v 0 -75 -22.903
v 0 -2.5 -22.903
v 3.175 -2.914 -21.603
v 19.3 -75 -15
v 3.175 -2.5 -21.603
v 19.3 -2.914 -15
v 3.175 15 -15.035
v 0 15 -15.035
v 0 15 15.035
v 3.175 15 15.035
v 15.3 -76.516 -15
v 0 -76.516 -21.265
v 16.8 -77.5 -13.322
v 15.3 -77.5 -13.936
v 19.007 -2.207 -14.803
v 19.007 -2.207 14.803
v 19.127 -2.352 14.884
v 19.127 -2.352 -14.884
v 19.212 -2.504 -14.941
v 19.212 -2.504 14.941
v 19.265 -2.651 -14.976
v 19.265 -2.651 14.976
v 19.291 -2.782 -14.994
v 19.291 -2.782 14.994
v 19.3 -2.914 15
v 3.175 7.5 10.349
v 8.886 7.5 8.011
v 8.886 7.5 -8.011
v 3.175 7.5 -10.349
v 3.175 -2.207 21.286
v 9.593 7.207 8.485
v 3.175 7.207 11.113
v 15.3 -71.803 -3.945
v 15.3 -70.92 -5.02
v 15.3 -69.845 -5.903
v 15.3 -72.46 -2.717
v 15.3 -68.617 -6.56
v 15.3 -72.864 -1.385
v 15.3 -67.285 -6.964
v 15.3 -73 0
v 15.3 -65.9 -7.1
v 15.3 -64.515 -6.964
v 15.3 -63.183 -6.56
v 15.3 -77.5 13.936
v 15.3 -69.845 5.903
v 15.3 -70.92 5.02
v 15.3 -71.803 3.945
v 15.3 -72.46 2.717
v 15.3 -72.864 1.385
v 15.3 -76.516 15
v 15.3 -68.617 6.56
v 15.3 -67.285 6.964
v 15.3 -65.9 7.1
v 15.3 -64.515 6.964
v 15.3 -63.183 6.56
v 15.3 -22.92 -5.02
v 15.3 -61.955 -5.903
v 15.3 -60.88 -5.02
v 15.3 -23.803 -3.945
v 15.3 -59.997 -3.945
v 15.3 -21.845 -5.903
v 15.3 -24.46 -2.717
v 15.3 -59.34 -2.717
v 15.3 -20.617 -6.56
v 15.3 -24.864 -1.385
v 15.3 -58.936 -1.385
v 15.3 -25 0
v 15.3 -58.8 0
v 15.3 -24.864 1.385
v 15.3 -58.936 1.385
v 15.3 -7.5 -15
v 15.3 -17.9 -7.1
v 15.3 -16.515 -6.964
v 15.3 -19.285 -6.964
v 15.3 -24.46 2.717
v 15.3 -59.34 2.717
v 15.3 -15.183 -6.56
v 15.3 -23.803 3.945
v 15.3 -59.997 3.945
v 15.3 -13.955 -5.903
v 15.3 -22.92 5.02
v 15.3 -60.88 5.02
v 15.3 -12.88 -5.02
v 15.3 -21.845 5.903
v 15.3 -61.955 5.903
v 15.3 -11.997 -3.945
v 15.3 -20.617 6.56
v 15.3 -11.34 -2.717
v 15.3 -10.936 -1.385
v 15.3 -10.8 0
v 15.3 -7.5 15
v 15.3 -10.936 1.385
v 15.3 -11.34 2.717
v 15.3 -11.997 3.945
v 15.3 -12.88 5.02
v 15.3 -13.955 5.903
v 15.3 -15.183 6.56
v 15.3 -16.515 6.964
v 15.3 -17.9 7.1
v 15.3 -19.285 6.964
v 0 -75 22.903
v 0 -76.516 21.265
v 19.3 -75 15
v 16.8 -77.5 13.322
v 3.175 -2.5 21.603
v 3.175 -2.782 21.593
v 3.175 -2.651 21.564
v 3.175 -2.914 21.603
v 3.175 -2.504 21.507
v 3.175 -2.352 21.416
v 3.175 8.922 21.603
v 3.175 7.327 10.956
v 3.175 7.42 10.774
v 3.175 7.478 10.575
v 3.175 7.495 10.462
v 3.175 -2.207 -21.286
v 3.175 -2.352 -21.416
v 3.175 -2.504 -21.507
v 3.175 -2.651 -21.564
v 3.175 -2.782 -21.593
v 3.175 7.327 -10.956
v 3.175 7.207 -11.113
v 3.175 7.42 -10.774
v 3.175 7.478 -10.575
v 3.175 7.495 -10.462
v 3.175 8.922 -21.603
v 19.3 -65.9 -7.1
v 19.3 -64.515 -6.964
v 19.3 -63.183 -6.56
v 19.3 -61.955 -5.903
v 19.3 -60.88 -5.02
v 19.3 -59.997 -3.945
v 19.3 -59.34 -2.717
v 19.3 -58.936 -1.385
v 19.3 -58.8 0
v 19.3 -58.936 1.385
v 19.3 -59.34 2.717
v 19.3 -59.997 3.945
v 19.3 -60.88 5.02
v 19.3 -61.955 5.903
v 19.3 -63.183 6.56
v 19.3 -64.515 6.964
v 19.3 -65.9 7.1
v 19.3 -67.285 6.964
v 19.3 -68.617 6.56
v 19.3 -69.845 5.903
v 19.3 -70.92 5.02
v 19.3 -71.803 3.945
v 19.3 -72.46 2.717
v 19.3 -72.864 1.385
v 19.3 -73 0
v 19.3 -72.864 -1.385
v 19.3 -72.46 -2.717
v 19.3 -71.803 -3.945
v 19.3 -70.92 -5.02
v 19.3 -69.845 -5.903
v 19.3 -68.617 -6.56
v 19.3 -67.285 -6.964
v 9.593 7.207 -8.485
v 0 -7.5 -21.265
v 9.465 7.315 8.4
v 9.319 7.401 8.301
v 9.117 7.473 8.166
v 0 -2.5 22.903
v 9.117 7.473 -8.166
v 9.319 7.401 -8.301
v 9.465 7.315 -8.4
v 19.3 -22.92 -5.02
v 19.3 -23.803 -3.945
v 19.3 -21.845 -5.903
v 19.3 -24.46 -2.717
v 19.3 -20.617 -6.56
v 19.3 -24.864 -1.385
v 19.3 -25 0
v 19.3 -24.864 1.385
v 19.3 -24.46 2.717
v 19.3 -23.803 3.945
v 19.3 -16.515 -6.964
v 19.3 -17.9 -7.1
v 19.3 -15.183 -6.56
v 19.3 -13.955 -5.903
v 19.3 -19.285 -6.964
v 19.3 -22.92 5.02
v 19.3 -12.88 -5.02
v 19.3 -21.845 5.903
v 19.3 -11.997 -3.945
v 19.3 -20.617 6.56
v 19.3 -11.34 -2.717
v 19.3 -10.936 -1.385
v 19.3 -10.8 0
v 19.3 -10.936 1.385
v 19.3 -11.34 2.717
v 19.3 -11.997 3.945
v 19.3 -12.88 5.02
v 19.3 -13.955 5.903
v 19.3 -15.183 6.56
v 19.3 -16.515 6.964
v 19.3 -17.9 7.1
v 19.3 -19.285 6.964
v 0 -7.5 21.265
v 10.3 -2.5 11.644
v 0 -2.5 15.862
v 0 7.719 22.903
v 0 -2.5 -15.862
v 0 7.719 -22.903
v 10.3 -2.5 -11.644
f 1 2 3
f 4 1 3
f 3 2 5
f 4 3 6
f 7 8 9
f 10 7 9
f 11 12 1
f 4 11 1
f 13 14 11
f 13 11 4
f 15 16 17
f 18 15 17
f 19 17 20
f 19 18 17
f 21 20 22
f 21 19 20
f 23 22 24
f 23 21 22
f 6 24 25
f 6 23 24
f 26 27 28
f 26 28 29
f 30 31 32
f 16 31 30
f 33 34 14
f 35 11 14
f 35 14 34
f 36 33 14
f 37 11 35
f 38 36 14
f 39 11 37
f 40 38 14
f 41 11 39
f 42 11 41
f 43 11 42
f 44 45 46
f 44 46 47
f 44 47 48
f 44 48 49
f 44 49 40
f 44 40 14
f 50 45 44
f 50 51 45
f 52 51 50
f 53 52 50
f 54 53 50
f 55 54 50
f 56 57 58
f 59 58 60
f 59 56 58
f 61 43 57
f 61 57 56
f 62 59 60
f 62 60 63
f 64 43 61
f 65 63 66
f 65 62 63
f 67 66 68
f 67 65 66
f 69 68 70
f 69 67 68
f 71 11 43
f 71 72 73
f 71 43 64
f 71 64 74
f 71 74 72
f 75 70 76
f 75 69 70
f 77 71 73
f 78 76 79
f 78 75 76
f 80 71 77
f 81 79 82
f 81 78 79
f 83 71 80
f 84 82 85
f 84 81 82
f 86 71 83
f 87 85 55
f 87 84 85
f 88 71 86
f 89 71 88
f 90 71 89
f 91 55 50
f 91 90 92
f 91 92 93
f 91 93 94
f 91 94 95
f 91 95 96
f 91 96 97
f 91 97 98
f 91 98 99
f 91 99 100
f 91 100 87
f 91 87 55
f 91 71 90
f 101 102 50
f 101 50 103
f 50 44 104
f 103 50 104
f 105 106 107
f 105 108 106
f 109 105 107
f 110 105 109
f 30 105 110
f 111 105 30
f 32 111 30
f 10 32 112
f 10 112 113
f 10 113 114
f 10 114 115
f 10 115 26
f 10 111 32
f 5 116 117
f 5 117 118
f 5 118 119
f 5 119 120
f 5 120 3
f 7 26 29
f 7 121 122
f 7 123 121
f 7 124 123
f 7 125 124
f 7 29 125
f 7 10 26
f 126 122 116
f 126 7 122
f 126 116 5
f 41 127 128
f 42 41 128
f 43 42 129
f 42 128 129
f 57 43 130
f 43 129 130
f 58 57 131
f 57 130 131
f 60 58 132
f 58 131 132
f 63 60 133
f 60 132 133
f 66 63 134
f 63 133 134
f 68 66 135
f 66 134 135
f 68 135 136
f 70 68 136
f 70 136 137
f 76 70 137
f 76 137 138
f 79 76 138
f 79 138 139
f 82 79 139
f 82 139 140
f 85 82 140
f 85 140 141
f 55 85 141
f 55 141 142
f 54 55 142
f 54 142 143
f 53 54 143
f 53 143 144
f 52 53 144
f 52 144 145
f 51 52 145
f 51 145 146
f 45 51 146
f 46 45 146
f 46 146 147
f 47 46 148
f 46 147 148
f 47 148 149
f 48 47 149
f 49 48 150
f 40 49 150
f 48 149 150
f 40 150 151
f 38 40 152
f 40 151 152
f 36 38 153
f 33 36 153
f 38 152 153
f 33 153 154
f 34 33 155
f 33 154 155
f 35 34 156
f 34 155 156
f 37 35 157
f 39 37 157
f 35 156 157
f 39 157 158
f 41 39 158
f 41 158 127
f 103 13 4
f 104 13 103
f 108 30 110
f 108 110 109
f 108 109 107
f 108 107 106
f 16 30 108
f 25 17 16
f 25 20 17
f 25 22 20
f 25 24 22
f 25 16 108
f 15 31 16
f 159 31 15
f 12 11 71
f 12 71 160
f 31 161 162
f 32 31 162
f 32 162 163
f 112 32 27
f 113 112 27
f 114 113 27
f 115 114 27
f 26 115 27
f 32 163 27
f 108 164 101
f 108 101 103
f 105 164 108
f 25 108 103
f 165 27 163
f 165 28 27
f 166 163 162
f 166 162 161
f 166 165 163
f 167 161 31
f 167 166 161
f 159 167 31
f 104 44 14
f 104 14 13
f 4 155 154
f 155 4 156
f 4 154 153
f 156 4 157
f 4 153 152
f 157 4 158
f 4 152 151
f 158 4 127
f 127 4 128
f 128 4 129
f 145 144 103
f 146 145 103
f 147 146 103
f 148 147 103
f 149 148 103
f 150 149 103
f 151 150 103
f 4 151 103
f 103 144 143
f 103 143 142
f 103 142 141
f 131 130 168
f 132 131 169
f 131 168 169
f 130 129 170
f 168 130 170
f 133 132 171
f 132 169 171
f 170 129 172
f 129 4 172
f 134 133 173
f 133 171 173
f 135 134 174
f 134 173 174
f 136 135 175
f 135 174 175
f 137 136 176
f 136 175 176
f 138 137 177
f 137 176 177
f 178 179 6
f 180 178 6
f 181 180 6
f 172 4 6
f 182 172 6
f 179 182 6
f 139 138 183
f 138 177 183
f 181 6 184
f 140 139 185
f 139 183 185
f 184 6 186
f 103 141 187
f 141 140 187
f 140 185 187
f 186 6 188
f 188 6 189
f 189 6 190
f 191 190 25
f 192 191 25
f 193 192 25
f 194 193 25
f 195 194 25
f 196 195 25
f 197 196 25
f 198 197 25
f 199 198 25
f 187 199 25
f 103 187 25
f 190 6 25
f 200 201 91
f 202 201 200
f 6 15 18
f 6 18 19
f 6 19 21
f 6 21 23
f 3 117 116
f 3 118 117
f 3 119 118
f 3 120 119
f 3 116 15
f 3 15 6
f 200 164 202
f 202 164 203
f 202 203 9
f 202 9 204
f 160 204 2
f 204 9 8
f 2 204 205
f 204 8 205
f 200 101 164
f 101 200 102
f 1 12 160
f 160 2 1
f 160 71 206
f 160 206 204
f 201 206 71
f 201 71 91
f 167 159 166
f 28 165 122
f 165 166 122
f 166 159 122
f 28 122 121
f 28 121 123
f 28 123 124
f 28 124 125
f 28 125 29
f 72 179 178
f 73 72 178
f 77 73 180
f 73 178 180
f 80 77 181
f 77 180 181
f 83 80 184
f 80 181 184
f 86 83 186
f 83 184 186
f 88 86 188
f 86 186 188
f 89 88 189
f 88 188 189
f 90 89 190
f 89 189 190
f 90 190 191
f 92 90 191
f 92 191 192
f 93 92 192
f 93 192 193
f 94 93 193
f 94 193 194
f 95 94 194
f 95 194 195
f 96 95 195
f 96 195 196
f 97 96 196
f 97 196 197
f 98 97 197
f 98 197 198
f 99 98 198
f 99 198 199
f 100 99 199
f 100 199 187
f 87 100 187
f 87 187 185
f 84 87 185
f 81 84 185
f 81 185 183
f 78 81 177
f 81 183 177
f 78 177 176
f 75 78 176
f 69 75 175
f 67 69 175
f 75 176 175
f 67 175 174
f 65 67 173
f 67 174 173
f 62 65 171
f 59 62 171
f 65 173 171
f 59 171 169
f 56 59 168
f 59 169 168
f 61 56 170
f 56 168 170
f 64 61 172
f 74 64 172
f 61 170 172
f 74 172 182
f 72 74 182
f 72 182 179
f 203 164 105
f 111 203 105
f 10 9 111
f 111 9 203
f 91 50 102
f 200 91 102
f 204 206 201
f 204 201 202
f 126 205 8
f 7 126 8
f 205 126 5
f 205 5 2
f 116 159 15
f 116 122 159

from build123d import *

# Parameters (mm, degrees)
SKETCH1_W            = 30
SKETCH1_H            = 5
BOSS_EXTRUDE1_DEPTH  = 19.3
SKETCH2_W            = 40
SKETCH2_H            = 10
BOSS_EXTRUDE2_DEPTH  = 3.175
SKETCH3_W            = 4
SKETCH3_H            = 30
BOSS_EXTRUDE3_DEPTH  = 75
CUT_EXTRUDE1_REACH   = 84.48
SKETCH4_R            = 7.1
BOSS_EXTRUDE7_DEPTH  = 5
BOSS_EXTRUDE8_DEPTH  = 5
CHAMFER1_SIZE        = 5
BOSS_EXTRUDE9_DEPTH  = 75
BOSS_EXTRUDE10_DEPTH = 5
CHAMFER2_SIZE        = 5
CHAMFER3_SIZE        = 10
BOSS_EXTRUDE15_DEPTH = 3.175
CUT_EXTRUDE2_DEPTH   = 81.759021382
FILLET6_R            = 1
FILLET7_R            = 1
CHAMFER6_SIZE        = 2.5


with BuildPart() as part:
    # Sketch1 → Boss-Extrude1 (new body)
    with BuildSketch(Plane(origin=(0, 0, 0), x_dir=(0, 0, -1), z_dir=(1, 0, 0))):
        Rectangle(SKETCH1_W, SKETCH1_H)
    extrude(amount=BOSS_EXTRUDE1_DEPTH)

    # Sketch2 → Boss-Extrude2 (add)
    with BuildSketch(Plane.ZY):
        with Locations((0.597390222, 2.5)):
            Rectangle(SKETCH2_W, SKETCH2_H)
    extrude(amount=-BOSS_EXTRUDE2_DEPTH)

    # Sketch3 → Boss-Extrude3 (add)
    with BuildSketch(Plane.XZ.offset(2.5)):
        with Locations((17.3, 0)):
            Rectangle(SKETCH3_W, SKETCH3_H)
    extrude(amount=BOSS_EXTRUDE3_DEPTH)

    # Sketch4 → Cut-Extrude1 (cut, up to next)
    with BuildSketch(Plane(origin=(19.3, 0, 0), x_dir=(0, 0, -1), z_dir=(1, 0, 0)), mode=Mode.PRIVATE) as cut_extrude1_sk1:
        with Locations((2.035e-06, -17.9)):
            Circle(SKETCH4_R)
    cut_extrude1_tool1 = extrude(cut_extrude1_sk1.sketch, amount=-CUT_EXTRUDE1_REACH, mode=Mode.PRIVATE) & part.part
    # Sketch4 → Cut-Extrude1 (cut, up to next)
    with BuildSketch(Plane(origin=(19.3, 0, 0), x_dir=(0, 0, -1), z_dir=(1, 0, 0)), mode=Mode.PRIVATE) as cut_extrude1_sk2:
        with Locations((-1.3e-07, -65.9)):
            Circle(SKETCH4_R)
    cut_extrude1_tool2 = extrude(cut_extrude1_sk2.sketch, amount=-CUT_EXTRUDE1_REACH, mode=Mode.PRIVATE) & part.part
    add(cut_extrude1_tool1.solids().sort_by_distance((19.3, -17.9, -2e-06))[0], mode=Mode.SUBTRACT)
    add(cut_extrude1_tool2.solids().sort_by_distance((19.3, -65.9, 0))[0], mode=Mode.SUBTRACT)

    # Sketch10 → Boss-Extrude7 (add)
    with BuildSketch(Plane(origin=(0, 2.5, 0), x_dir=(1, 0, 0), z_dir=(0, 1, 0))):
        Polygon((3.175, 19.402609778), (0, 19.402609778), (0, 22.902609778), (19.3, 15), (3.175, 15), align=None)
    boss_extrude7 = extrude(amount=-BOSS_EXTRUDE7_DEPTH)

    # Sketch11 → Boss-Extrude8 (add)
    with BuildSketch(Plane(origin=(0, 2.5, 0), x_dir=(1, 0, 0), z_dir=(0, 1, 0))):
        Polygon((0, 19.402609778), (0, 22.902609778), (3.175, 21.60256905), (3.175, 19.402609778), align=None)
    boss_extrude8 = extrude(amount=BOSS_EXTRUDE8_DEPTH)

    # Mirror2: Boss-Extrude7, Boss-Extrude8 across plane
    add(boss_extrude7.mirror(Plane(origin=(0, 0, 0), x_dir=(1, 0, 0), z_dir=(0, 0, -1))))
    add(boss_extrude8.mirror(Plane(origin=(0, 0, 0), x_dir=(1, 0, 0), z_dir=(0, 0, -1))))

    # Chamfer1
    chamfer1_edges = [part.edges().sort_by_distance(p)[0] for p in [
        (3.175, 2.5, 0),
    ]]
    chamfer(chamfer1_edges, length=CHAMFER1_SIZE - 0.0001)  # a hair under: the kernel refuses the full size

    # Sketch12 → Boss-Extrude9 (add)
    with BuildSketch(Plane.XZ.offset(2.5)):
        Polygon((0, -22.902609778), (19.3, -15), (15.3, -15), (0, -21.264763192), align=None)
        Polygon((0, 22.902609778), (19.3, 15), (15.3, 15), (0, 21.264763192), align=None)
    extrude(amount=BOSS_EXTRUDE9_DEPTH)

    # Sketch13 → Boss-Extrude10 (add)
    with BuildSketch(Plane(origin=(0, 2.5, 0), x_dir=(1, 0, 0), z_dir=(0, 1, 0))):
        Polygon((3.175, 21.60256905), (3.175, -21.60256905), (19.3, -15), (19.3, 15), align=None)
    extrude(amount=BOSS_EXTRUDE10_DEPTH)

    # Chamfer2
    chamfer2_edges = [part.edges().sort_by_distance(p)[0] for p in [
        (7.65, -2.5, -18.132381596),
        (7.65, -2.5, 18.132381596),
        (15.3, -2.5, 0),
    ]]
    chamfer(chamfer2_edges, length=CHAMFER2_SIZE)

    # Chamfer3
    chamfer3_edges = [part.edges().sort_by_distance(p)[0] for p in [
        (9.65, 7.5, 18.951304889),
        (19.3, 7.5, 0),
        (9.65, 7.5, -18.951304889),
    ]]
    chamfer(chamfer3_edges, length=CHAMFER3_SIZE)

    # Sketch14 → Boss-Extrude15 (add)
    with BuildSketch(Plane.ZY):
        Polygon((-22.902609778, -2.5), (-22.902609778, 7.718772797), (-15.034642071, 15), (15.034642071, 15), (22.902609778, 7.718772797), (22.902609778, -2.5), align=None)
    extrude(amount=-BOSS_EXTRUDE15_DEPTH)

    # Sketch15 → Cut-Extrude2 (cut, through all)
    with BuildSketch(Plane.XZ.offset(2.5)):
        Polygon((3.175, 22.902609778), (0, 22.902609778), (3.175, 21.60256905), align=None)
        Polygon((3.175, -22.902609778), (3.175, -21.60256905), (0, -22.902609778), align=None)
    extrude(amount=-CUT_EXTRUDE2_DEPTH, mode=Mode.SUBTRACT)

    # Fillet6
    fillet6_edges = [part.edges().sort_by_distance(p)[0] for p in [
        (9.3, 7.5, 0),
        (6.2375, 7.5, -9.542766367),
        (6.2375, 7.5, 9.542766367),
    ]]
    fillet(fillet6_edges, radius=FILLET6_R)

    # Fillet7
    fillet7_edges = [part.edges().sort_by_distance(p)[0] for p in [
        (11.2375, -2.5, 18.301284525),
        (19.3, -2.5, 0),
        (11.2375, -2.5, -18.301284525),
    ]]
    fillet(fillet7_edges, radius=FILLET7_R)

    # Chamfer6
    chamfer6_edges = [part.edges().sort_by_distance(p)[0] for p in [
        (9.65, -77.5, -18.951304889),
        (19.3, -77.5, 0),
        (9.65, -77.5, 18.951304889),
    ]]
    chamfer(chamfer6_edges, length=CHAMFER6_SIZE)


solid = part.part
